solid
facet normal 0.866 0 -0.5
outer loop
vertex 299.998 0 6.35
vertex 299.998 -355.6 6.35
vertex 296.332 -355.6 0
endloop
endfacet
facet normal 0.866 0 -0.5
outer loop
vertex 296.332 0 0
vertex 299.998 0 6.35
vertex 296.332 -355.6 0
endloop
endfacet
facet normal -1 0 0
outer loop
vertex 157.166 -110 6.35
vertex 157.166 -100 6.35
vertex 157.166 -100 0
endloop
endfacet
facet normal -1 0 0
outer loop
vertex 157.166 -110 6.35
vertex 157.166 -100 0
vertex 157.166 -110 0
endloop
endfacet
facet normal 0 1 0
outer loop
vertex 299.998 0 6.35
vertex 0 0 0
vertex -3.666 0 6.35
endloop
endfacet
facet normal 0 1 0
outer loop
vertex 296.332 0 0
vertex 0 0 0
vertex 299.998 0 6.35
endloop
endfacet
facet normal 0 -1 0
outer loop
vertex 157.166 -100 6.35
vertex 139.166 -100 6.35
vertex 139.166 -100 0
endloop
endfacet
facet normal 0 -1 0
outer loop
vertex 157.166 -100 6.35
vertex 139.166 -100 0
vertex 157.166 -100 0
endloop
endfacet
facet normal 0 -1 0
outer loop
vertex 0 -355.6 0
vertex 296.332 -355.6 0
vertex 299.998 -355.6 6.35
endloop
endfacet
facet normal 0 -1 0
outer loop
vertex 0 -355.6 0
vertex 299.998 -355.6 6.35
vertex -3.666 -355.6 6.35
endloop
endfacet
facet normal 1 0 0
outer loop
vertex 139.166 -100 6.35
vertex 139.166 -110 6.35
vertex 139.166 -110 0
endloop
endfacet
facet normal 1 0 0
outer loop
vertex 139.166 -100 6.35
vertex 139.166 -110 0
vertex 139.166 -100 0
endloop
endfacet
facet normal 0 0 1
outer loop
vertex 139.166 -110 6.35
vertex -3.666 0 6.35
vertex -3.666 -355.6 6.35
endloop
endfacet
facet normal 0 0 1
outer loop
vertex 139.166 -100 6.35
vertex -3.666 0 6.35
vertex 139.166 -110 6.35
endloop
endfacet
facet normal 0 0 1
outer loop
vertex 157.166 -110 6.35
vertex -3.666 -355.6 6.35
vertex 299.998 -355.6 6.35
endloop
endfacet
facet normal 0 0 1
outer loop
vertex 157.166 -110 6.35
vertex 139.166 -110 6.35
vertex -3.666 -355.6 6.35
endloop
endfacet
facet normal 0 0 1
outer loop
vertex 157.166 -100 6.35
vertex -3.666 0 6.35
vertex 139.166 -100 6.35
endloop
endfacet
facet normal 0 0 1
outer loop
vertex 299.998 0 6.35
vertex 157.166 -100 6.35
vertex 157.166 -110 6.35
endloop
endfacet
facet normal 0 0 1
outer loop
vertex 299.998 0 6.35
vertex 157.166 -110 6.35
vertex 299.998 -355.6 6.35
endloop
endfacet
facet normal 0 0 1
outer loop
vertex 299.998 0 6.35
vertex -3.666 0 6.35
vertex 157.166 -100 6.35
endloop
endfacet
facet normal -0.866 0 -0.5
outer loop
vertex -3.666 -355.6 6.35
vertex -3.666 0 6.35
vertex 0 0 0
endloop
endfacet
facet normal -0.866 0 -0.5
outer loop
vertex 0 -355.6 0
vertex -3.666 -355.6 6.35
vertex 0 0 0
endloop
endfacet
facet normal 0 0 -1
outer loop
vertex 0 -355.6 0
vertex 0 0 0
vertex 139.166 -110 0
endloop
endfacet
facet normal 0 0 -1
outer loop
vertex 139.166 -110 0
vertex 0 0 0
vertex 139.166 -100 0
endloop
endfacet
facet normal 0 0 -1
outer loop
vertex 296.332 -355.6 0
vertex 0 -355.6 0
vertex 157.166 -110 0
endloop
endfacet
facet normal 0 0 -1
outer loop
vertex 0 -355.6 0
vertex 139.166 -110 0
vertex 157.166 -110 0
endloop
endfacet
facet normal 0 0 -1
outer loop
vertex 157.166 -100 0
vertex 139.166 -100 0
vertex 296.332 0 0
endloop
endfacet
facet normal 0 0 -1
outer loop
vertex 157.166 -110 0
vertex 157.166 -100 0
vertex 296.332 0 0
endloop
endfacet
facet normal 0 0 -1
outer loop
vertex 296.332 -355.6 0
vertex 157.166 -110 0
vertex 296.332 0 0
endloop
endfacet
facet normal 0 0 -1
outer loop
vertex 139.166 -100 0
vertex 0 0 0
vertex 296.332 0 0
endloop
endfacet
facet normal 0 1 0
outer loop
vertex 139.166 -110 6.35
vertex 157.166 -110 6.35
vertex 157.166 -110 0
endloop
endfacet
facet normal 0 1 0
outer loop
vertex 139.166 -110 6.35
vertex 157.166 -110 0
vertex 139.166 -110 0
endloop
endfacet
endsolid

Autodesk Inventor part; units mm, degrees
ref_plane "YZ Plane" through (0, 0, 0) normal (1, 0, 0) x (0, 1, 0)
ref_plane "XZ Plane" through (0, 0, 0) normal (0, 1, 0) x (-1, 0, 0)
ref_plane "XY Plane" through (0, 0, 0) normal (0, 0, 1) x (1, 0, 0)
sketch "Sketch1" plane through (0, 0, 0) normal (0, 0, 1) x (1, 0, 0)
  line L0 (0, 0) -> (296.3316, 0)
  line L1 (296.3316, 0) -> (296.3316, -355.6)
  line L2 (296.3316, -355.6) -> (0, -355.6)
  line L3 (0, -355.6) -> (0, 0)
  dimension "d0" = 296.3316
  dimension "d1" = 355.6
extrude "Extrusion1" add sketch "Sketch1" along normal blind 6.35
sketch "Sketch2" plane through (0, 0, 0) normal (0, 1, 0) x (1, 0, 0)
  line L0 (296.3316, -6.35) -> (0, -6.35) projected
  line L1 (0, -6.35) -> (-3.6662, -6.35)
  line L2 (-3.6662, -6.35) -> (0, 0)
  line L3 (0, 0) -> (0, -6.35) projected
  line L4 (0, 0) -> (0, -6.35) projected
  line L5 (0, -6.35) -> (0, 0)
  line L6 (296.3316, -6.35) -> (299.9978, -6.35)
  line L7 (296.3316, 0) -> (296.3316, -6.35) projected
  line L8 (299.9978, -6.35) -> (296.3316, 0)
  line L9 (296.3316, 0) -> (296.3316, -6.35)
  dimension "d4" = 30
  dimension "d5" = 60
extrude "Extrusion2" add sketch "Sketch2" against normal blind 355.6
sketch "Sketch5" plane through (0, 0, 6.35) normal (0, 0, 1) x (1, 0, 0)
  line L0 (139.1658, -100) -> (157.1658, -100)
  line L1 (157.1658, -100) -> (157.1658, -110)
  line L2 (157.1658, -110) -> (139.1658, -110)
  line L3 (139.1658, -110) -> (139.1658, -100)
  line L4 (-3.6662, 0) -> (299.9978, 0) projected
  point P0 (0, 0)
  point P1 (148.1658, -100)
  point P2 (148.1658, 0)
  dimension "d77" = 18
  dimension "d78" = 10
  dimension "d79" = 100
extrude "Extrusion5" cut sketch "Sketch5" against normal through all
properties part number "BA03" material "ABS Plastic"
